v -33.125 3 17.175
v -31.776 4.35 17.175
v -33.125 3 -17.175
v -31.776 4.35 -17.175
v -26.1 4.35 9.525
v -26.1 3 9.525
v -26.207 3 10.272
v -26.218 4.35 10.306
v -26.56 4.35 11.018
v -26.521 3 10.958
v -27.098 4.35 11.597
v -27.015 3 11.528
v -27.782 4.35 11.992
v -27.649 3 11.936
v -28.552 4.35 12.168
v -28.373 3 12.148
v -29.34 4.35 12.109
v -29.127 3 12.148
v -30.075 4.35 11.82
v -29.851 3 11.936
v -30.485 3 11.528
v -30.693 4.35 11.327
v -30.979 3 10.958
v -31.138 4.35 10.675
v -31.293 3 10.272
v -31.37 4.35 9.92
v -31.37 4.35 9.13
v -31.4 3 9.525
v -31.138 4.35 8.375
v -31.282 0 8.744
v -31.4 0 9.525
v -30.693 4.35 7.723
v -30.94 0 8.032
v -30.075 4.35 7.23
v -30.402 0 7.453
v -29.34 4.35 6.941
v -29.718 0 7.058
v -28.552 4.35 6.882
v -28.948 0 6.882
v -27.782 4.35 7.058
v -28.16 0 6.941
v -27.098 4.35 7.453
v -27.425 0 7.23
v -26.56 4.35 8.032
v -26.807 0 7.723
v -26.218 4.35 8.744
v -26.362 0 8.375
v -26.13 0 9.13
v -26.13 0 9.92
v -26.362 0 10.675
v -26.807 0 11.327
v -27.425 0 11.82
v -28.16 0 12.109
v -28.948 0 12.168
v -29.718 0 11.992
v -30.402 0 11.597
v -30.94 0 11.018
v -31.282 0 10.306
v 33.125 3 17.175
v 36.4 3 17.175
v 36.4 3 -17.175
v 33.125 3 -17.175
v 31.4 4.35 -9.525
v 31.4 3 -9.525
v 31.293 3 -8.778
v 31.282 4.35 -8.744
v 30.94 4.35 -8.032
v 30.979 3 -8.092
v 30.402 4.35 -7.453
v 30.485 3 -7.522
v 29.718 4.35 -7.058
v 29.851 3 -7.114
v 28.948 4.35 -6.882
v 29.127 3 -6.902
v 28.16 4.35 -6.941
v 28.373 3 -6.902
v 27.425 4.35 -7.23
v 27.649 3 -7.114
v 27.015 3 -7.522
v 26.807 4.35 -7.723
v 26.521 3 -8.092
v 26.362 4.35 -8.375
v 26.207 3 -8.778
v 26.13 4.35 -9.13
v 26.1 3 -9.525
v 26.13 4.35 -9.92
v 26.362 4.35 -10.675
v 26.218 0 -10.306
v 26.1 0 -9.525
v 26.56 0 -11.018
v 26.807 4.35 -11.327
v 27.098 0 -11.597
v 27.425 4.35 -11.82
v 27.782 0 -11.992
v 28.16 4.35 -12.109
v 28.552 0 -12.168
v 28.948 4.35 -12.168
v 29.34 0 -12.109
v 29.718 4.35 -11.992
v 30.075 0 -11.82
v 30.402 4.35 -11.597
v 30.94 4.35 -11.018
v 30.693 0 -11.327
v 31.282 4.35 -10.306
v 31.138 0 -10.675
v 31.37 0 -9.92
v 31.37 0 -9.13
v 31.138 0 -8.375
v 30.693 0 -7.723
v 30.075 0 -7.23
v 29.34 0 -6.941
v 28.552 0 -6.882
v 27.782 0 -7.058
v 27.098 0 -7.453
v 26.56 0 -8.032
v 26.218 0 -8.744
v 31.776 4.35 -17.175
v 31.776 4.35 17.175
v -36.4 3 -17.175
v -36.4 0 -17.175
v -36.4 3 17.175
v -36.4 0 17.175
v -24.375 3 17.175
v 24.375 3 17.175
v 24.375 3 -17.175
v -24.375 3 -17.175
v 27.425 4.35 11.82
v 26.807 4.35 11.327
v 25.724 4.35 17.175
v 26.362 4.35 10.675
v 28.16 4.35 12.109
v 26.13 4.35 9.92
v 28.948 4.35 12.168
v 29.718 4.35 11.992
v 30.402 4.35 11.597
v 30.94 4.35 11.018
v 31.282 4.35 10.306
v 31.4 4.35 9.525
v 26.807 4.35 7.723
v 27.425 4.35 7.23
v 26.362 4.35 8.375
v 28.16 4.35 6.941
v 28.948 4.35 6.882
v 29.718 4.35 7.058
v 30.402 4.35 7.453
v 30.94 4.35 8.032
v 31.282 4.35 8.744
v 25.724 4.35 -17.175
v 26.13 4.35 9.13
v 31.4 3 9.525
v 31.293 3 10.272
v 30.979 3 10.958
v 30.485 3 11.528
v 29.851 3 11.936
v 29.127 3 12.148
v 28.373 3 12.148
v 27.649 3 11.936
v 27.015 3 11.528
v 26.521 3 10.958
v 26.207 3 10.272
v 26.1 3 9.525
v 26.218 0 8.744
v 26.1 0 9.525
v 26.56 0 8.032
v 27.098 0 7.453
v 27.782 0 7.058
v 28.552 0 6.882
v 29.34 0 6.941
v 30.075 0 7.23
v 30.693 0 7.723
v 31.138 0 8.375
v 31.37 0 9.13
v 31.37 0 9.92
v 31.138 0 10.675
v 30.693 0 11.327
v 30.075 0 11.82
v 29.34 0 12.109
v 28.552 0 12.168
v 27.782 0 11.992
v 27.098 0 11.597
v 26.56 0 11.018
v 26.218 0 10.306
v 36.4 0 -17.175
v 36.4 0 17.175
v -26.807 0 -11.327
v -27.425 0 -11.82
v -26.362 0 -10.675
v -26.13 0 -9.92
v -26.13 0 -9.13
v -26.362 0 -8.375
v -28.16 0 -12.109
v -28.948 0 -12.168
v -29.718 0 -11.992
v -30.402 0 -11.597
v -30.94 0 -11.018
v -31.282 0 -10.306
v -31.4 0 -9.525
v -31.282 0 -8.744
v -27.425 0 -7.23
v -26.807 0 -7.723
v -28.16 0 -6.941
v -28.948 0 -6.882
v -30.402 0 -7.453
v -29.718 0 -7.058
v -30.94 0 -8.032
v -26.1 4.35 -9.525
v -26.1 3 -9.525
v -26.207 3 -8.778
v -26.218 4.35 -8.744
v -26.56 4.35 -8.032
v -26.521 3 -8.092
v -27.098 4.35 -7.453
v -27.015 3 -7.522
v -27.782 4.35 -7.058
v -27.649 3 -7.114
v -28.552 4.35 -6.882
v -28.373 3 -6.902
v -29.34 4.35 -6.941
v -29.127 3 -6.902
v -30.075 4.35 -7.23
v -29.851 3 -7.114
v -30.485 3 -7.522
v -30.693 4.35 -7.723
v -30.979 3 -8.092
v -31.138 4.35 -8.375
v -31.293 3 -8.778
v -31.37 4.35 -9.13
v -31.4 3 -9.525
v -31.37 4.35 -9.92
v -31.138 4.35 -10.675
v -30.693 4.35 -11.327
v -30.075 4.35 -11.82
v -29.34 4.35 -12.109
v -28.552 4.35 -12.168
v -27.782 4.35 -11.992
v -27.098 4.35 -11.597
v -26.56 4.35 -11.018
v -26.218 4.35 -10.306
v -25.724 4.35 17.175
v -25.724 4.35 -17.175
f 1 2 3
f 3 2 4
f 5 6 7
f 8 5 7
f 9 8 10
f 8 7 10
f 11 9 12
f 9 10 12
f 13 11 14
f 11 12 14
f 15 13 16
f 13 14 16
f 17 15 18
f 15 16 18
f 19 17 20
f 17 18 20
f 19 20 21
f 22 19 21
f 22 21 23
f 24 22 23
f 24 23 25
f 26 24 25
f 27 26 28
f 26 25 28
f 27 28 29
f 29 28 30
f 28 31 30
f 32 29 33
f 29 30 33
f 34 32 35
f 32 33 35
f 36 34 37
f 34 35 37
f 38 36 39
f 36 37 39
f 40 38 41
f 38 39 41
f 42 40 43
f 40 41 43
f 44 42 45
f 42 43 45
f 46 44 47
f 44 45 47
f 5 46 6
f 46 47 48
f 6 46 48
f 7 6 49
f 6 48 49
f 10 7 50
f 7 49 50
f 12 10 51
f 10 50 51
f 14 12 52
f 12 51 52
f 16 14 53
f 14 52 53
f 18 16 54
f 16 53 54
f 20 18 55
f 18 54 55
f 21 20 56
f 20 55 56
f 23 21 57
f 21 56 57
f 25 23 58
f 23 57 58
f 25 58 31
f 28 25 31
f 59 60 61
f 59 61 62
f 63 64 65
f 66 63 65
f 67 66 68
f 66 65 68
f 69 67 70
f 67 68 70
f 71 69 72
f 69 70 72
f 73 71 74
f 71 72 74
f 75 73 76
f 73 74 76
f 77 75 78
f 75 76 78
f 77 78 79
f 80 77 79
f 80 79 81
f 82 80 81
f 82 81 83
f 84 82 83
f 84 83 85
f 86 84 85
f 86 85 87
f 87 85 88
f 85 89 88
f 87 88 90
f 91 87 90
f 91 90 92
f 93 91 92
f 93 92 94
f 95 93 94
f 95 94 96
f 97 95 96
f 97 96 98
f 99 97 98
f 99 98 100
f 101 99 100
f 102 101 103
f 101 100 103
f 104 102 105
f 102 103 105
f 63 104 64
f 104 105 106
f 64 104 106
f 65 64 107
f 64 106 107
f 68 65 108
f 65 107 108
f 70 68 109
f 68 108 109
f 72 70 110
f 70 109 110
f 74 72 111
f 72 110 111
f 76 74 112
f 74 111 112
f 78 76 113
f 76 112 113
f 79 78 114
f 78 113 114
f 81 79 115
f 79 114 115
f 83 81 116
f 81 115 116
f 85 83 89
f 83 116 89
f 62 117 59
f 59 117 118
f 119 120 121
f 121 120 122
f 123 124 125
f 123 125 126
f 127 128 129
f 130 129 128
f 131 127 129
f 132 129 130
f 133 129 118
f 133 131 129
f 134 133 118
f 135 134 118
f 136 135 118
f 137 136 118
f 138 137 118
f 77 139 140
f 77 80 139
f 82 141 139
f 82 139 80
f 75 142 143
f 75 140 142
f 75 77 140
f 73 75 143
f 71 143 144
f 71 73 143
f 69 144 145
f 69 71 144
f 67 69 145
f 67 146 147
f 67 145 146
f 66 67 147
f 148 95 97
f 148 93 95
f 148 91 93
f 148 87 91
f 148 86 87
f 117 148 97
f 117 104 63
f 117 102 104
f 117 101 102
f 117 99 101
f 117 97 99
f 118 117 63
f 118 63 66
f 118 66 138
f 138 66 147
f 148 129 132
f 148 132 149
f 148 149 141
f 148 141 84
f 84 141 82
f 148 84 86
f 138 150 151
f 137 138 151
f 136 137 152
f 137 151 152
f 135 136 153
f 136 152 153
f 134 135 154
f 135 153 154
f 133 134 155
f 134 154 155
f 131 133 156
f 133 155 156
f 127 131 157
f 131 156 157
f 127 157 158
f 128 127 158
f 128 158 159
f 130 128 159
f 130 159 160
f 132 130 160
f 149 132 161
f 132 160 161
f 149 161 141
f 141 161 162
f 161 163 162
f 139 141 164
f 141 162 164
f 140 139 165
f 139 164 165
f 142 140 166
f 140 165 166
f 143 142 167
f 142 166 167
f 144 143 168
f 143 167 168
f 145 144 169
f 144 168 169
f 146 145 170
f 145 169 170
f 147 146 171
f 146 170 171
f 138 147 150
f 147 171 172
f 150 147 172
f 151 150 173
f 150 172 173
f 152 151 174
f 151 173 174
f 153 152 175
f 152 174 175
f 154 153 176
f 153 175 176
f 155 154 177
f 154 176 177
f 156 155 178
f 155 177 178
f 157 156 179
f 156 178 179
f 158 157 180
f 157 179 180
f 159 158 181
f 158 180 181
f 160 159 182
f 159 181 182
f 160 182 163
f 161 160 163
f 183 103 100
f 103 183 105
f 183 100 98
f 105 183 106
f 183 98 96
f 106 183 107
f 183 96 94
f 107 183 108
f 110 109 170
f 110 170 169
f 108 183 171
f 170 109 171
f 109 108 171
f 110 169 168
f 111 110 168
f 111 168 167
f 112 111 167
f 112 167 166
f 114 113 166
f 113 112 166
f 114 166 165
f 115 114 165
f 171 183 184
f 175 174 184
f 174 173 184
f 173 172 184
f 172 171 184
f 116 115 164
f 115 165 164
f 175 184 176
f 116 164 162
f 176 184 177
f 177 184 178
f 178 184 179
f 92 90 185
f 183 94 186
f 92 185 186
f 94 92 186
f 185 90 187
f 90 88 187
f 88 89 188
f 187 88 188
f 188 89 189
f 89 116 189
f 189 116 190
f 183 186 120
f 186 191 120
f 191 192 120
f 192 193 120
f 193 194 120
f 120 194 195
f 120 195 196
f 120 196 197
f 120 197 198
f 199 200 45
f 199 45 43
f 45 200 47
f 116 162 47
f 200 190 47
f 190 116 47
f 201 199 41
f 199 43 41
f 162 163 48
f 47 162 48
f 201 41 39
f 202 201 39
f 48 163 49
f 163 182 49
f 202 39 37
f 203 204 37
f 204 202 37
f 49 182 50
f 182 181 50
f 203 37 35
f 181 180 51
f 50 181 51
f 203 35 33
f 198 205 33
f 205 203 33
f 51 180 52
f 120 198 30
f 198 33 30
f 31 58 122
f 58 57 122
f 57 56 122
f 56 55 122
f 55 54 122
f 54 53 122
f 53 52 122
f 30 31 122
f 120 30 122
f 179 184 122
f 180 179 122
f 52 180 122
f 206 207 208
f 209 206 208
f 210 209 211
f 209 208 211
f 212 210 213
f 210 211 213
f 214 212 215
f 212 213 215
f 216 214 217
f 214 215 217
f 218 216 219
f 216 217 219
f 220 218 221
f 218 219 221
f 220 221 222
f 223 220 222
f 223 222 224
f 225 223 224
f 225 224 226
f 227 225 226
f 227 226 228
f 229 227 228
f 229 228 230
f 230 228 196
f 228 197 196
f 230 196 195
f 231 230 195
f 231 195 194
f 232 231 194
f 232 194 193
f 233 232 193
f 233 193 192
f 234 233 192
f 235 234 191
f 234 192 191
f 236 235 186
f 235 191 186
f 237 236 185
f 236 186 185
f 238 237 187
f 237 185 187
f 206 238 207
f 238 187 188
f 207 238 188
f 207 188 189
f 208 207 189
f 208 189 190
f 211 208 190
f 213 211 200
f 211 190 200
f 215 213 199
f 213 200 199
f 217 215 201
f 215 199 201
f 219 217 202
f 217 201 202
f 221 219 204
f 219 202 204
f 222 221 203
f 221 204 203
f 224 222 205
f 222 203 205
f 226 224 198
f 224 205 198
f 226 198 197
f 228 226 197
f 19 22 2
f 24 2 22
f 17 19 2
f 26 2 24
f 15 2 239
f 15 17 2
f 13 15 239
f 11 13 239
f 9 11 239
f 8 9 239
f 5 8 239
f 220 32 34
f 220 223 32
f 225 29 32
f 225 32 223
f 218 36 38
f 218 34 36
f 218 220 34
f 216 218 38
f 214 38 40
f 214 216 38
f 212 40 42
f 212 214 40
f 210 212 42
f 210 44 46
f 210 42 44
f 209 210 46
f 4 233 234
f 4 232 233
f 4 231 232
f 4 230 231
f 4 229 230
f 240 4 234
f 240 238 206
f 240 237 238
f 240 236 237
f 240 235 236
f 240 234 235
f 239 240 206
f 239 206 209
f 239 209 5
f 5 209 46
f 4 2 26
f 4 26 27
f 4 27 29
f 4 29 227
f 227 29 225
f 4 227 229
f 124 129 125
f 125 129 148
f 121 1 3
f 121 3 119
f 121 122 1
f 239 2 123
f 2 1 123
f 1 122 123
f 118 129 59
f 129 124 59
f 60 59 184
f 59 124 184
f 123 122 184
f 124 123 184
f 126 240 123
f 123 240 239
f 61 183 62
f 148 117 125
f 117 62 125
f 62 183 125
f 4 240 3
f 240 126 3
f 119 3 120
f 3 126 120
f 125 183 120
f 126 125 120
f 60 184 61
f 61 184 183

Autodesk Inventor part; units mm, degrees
ref_plane "YZ Plane" through (0, 0, 0) normal (1, 0, 0) x (0, 1, 0)
ref_plane "XZ Plane" through (0, 0, 0) normal (0, 1, 0) x (-1, 0, 0)
ref_plane "XY Plane" through (0, 0, 0) normal (0, 0, 1) x (1, 0, 0)
sketch "Sketch1" plane through (0, 0, 0) normal (0, 1, 0) x (-1, 0, 0)
  line L0 (28.75, 9.525) -> (-28.75, 9.525) construction
  line L1 (-28.75, 9.525) -> (-28.75, -9.525) construction
  line L2 (-28.75, -9.525) -> (28.75, -9.525) construction
  line L3 (28.75, -9.525) -> (28.75, 9.525) construction
  line L4 (28.75, 9.525) -> (-28.75, -9.525) construction
  line L5 (-28.75, 9.525) -> (28.75, -9.525) construction
  circle A0 centre (28.75, 9.525) radius 2.65
  circle A1 centre (28.75, -9.525) radius 2.65
  circle A2 centre (-28.75, 9.525) radius 2.65
  circle A3 centre (-28.75, -9.525) radius 2.65
  line L6 (36.4, 17.175) -> (-36.4, 17.175)
  line L7 (-36.4, 17.175) -> (-36.4, -17.175)
  line L8 (-36.4, -17.175) -> (36.4, -17.175)
  line L9 (36.4, -17.175) -> (36.4, 17.175)
  line L10 (36.4, 17.175) -> (-36.4, -17.175) construction
  line L11 (-36.4, 17.175) -> (36.4, -17.175) construction
  point P0 (0, 0)
  dimension "d0" = 19.05
  dimension "d1" = 57.5
  dimension "d2" = 5.3
  dimension "d3" = 5
  dimension "d4" = 5
extrude "Extrusion1" add sketch "Sketch1" along normal blind 3
sketch "Sketch2" plane through (0, 3, 0) normal (0, 1, 0) x (1, 0, 0)
  line L0 (36.4, -17.175) -> (36.4, 17.175) projected
  line L1 (36.4, 17.175) -> (-36.4, 17.175) projected
  line L2 (-36.4, 17.175) -> (-36.4, -17.175) projected
  line L3 (-36.4, -17.175) -> (36.4, -17.175) projected
  circle A0 centre (-28.75, -9.525) radius 2.65 projected
  circle A1 centre (-28.75, 9.525) radius 2.65 projected
  circle A2 centre (28.75, -9.525) radius 2.65 projected
  circle A3 centre (28.75, 9.525) radius 2.65 projected
  line L4 (-24.375, 17.175) -> (-33.125, 17.175)
  line L5 (-33.125, 17.175) -> (-33.125, -17.175)
  line L6 (-33.125, -17.175) -> (-24.375, -17.175)
  line L7 (-24.375, -17.175) -> (-24.375, 17.175)
  line L8 (-28.75, -17.175) -> (-28.75, 17.175) construction
  line L9 (33.125, 17.175) -> (24.375, 17.175)
  line L10 (24.375, 17.175) -> (24.375, -17.175)
  line L11 (24.375, -17.175) -> (33.125, -17.175)
  line L12 (33.125, -17.175) -> (33.125, 17.175)
  line L13 (28.75, 17.175) -> (28.75, -17.175) construction
  line L14 (36.4, 17.175) -> (-36.4, 17.175) projected
  line L15 (-36.4, -17.175) -> (36.4, -17.175) projected
  dimension "d14" = 8.75
extrude "Extrusion2" add sketch "Sketch2" along normal blind 1.35 contours L3 L10 L1 L12 | L3 L5 L1 L7
chamfer "Chamfer2" distance 1.35 angle 45 4 edges at (-33.125, 4.35, 0) (-24.375, 4.35, 0) (24.375, 4.35, 0) (33.125, 4.35, 0)
properties part number "Platina" material "PET Plastic"
